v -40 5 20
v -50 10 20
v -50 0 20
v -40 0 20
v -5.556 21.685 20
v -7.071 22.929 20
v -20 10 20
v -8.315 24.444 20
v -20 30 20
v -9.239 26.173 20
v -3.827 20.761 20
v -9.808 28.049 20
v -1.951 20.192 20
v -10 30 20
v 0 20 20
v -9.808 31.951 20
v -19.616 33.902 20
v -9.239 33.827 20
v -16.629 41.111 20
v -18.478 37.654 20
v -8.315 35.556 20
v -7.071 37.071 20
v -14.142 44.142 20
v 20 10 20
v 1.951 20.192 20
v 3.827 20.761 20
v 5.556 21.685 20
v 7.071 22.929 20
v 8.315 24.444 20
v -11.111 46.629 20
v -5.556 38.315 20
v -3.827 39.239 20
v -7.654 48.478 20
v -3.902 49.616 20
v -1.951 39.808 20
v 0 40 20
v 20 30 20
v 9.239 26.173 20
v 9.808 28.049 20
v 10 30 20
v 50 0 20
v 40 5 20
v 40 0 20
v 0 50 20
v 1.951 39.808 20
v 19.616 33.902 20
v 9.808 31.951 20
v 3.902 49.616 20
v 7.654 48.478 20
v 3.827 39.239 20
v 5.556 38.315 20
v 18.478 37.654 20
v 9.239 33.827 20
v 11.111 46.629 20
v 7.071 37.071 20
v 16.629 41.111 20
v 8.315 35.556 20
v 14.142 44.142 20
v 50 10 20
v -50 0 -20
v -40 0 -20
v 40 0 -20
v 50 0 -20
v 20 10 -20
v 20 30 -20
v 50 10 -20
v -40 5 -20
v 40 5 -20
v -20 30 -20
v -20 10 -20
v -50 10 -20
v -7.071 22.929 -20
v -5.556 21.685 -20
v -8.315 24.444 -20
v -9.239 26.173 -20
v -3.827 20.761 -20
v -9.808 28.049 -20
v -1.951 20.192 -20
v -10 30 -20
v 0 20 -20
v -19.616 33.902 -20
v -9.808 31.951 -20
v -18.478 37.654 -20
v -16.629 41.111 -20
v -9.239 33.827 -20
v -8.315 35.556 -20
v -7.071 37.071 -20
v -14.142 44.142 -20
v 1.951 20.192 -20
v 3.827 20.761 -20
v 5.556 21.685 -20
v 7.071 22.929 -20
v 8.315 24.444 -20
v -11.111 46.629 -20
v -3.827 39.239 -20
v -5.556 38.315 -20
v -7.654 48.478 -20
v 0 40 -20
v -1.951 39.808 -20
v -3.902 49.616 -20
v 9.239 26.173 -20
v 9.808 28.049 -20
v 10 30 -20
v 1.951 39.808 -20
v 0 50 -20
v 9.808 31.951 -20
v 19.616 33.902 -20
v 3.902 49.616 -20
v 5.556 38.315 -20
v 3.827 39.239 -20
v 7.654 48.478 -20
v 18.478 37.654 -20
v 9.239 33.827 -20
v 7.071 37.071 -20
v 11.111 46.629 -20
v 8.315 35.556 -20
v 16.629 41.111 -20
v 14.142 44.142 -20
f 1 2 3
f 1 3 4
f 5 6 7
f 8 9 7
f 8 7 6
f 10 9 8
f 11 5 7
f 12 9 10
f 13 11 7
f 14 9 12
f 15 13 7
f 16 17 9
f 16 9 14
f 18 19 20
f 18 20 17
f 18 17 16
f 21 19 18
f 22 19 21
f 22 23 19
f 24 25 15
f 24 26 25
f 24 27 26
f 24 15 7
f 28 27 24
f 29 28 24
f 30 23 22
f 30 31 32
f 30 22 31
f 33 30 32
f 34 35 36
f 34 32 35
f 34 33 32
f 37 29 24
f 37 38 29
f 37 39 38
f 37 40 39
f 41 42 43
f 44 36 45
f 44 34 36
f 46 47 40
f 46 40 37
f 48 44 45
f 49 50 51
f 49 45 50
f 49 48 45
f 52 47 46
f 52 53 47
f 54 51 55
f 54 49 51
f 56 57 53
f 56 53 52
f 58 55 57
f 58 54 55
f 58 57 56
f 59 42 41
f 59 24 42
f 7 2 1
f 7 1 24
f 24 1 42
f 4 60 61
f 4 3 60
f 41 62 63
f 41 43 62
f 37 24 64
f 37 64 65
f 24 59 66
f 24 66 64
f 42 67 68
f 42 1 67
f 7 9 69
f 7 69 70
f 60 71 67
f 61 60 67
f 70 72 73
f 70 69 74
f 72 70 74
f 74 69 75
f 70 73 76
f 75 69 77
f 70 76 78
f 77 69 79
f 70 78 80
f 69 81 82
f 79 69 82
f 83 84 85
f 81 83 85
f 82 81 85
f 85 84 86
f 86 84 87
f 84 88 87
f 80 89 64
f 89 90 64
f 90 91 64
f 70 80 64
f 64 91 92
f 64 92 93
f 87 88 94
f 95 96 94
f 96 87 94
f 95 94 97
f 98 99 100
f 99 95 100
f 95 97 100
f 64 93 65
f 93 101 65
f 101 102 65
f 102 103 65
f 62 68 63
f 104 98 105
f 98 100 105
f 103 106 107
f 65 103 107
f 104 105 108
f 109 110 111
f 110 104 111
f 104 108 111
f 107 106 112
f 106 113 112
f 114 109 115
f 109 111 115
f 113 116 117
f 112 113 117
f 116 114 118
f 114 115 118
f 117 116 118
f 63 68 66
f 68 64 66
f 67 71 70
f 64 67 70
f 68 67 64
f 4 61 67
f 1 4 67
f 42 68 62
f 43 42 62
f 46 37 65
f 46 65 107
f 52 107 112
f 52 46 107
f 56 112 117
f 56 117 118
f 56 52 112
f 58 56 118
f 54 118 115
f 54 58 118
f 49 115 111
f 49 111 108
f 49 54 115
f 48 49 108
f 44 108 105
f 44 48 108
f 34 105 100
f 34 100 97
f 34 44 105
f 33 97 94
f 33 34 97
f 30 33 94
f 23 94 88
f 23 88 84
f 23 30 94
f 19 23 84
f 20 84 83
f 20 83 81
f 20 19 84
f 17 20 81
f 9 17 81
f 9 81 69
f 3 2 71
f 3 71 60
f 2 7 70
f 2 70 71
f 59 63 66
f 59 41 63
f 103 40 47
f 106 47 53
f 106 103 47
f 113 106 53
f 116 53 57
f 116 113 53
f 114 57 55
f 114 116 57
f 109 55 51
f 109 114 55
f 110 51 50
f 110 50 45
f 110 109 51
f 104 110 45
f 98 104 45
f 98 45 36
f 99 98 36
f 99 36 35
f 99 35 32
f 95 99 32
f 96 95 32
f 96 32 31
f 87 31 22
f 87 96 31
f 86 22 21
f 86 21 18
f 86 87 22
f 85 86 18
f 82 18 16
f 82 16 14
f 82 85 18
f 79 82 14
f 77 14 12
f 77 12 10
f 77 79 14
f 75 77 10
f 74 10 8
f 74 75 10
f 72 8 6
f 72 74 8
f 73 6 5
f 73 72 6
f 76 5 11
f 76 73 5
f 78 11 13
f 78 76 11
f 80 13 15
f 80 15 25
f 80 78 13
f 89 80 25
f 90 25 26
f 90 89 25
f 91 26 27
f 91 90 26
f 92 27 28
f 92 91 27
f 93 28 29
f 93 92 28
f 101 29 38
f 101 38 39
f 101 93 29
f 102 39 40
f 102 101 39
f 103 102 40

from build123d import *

# Parameters (mm, degrees)
SKETCH1_R           = 10
BOSS_EXTRUDE1_DEPTH = 20


with BuildPart() as part:
    # Sketch1 → Boss-Extrude1 (new, symmetric)
    with BuildSketch(Plane.XY):
        with BuildLine():
            Line((50, 0), (50, 10))
            Line((50, 10), (20, 10))
            Line((20, 10), (20, 30))
            ThreePointArc((20, 30), (0, 50), (-20, 30))
            Line((-20, 30), (-20, 10))
            Line((-20, 10), (-50, 10))
            Line((-50, 10), (-50, 0))
            Line((-50, 0), (-40, 0))
            Line((-40, 0), (-40, 5))
            Line((-40, 5), (40, 5))
            Line((40, 5), (40, 0))
            Line((40, 0), (50, 0))
        make_face()
        with Locations((0, 30)):
            Circle(SKETCH1_R, mode=Mode.SUBTRACT)
    extrude(amount=BOSS_EXTRUDE1_DEPTH, both=True)


solid = part.part
